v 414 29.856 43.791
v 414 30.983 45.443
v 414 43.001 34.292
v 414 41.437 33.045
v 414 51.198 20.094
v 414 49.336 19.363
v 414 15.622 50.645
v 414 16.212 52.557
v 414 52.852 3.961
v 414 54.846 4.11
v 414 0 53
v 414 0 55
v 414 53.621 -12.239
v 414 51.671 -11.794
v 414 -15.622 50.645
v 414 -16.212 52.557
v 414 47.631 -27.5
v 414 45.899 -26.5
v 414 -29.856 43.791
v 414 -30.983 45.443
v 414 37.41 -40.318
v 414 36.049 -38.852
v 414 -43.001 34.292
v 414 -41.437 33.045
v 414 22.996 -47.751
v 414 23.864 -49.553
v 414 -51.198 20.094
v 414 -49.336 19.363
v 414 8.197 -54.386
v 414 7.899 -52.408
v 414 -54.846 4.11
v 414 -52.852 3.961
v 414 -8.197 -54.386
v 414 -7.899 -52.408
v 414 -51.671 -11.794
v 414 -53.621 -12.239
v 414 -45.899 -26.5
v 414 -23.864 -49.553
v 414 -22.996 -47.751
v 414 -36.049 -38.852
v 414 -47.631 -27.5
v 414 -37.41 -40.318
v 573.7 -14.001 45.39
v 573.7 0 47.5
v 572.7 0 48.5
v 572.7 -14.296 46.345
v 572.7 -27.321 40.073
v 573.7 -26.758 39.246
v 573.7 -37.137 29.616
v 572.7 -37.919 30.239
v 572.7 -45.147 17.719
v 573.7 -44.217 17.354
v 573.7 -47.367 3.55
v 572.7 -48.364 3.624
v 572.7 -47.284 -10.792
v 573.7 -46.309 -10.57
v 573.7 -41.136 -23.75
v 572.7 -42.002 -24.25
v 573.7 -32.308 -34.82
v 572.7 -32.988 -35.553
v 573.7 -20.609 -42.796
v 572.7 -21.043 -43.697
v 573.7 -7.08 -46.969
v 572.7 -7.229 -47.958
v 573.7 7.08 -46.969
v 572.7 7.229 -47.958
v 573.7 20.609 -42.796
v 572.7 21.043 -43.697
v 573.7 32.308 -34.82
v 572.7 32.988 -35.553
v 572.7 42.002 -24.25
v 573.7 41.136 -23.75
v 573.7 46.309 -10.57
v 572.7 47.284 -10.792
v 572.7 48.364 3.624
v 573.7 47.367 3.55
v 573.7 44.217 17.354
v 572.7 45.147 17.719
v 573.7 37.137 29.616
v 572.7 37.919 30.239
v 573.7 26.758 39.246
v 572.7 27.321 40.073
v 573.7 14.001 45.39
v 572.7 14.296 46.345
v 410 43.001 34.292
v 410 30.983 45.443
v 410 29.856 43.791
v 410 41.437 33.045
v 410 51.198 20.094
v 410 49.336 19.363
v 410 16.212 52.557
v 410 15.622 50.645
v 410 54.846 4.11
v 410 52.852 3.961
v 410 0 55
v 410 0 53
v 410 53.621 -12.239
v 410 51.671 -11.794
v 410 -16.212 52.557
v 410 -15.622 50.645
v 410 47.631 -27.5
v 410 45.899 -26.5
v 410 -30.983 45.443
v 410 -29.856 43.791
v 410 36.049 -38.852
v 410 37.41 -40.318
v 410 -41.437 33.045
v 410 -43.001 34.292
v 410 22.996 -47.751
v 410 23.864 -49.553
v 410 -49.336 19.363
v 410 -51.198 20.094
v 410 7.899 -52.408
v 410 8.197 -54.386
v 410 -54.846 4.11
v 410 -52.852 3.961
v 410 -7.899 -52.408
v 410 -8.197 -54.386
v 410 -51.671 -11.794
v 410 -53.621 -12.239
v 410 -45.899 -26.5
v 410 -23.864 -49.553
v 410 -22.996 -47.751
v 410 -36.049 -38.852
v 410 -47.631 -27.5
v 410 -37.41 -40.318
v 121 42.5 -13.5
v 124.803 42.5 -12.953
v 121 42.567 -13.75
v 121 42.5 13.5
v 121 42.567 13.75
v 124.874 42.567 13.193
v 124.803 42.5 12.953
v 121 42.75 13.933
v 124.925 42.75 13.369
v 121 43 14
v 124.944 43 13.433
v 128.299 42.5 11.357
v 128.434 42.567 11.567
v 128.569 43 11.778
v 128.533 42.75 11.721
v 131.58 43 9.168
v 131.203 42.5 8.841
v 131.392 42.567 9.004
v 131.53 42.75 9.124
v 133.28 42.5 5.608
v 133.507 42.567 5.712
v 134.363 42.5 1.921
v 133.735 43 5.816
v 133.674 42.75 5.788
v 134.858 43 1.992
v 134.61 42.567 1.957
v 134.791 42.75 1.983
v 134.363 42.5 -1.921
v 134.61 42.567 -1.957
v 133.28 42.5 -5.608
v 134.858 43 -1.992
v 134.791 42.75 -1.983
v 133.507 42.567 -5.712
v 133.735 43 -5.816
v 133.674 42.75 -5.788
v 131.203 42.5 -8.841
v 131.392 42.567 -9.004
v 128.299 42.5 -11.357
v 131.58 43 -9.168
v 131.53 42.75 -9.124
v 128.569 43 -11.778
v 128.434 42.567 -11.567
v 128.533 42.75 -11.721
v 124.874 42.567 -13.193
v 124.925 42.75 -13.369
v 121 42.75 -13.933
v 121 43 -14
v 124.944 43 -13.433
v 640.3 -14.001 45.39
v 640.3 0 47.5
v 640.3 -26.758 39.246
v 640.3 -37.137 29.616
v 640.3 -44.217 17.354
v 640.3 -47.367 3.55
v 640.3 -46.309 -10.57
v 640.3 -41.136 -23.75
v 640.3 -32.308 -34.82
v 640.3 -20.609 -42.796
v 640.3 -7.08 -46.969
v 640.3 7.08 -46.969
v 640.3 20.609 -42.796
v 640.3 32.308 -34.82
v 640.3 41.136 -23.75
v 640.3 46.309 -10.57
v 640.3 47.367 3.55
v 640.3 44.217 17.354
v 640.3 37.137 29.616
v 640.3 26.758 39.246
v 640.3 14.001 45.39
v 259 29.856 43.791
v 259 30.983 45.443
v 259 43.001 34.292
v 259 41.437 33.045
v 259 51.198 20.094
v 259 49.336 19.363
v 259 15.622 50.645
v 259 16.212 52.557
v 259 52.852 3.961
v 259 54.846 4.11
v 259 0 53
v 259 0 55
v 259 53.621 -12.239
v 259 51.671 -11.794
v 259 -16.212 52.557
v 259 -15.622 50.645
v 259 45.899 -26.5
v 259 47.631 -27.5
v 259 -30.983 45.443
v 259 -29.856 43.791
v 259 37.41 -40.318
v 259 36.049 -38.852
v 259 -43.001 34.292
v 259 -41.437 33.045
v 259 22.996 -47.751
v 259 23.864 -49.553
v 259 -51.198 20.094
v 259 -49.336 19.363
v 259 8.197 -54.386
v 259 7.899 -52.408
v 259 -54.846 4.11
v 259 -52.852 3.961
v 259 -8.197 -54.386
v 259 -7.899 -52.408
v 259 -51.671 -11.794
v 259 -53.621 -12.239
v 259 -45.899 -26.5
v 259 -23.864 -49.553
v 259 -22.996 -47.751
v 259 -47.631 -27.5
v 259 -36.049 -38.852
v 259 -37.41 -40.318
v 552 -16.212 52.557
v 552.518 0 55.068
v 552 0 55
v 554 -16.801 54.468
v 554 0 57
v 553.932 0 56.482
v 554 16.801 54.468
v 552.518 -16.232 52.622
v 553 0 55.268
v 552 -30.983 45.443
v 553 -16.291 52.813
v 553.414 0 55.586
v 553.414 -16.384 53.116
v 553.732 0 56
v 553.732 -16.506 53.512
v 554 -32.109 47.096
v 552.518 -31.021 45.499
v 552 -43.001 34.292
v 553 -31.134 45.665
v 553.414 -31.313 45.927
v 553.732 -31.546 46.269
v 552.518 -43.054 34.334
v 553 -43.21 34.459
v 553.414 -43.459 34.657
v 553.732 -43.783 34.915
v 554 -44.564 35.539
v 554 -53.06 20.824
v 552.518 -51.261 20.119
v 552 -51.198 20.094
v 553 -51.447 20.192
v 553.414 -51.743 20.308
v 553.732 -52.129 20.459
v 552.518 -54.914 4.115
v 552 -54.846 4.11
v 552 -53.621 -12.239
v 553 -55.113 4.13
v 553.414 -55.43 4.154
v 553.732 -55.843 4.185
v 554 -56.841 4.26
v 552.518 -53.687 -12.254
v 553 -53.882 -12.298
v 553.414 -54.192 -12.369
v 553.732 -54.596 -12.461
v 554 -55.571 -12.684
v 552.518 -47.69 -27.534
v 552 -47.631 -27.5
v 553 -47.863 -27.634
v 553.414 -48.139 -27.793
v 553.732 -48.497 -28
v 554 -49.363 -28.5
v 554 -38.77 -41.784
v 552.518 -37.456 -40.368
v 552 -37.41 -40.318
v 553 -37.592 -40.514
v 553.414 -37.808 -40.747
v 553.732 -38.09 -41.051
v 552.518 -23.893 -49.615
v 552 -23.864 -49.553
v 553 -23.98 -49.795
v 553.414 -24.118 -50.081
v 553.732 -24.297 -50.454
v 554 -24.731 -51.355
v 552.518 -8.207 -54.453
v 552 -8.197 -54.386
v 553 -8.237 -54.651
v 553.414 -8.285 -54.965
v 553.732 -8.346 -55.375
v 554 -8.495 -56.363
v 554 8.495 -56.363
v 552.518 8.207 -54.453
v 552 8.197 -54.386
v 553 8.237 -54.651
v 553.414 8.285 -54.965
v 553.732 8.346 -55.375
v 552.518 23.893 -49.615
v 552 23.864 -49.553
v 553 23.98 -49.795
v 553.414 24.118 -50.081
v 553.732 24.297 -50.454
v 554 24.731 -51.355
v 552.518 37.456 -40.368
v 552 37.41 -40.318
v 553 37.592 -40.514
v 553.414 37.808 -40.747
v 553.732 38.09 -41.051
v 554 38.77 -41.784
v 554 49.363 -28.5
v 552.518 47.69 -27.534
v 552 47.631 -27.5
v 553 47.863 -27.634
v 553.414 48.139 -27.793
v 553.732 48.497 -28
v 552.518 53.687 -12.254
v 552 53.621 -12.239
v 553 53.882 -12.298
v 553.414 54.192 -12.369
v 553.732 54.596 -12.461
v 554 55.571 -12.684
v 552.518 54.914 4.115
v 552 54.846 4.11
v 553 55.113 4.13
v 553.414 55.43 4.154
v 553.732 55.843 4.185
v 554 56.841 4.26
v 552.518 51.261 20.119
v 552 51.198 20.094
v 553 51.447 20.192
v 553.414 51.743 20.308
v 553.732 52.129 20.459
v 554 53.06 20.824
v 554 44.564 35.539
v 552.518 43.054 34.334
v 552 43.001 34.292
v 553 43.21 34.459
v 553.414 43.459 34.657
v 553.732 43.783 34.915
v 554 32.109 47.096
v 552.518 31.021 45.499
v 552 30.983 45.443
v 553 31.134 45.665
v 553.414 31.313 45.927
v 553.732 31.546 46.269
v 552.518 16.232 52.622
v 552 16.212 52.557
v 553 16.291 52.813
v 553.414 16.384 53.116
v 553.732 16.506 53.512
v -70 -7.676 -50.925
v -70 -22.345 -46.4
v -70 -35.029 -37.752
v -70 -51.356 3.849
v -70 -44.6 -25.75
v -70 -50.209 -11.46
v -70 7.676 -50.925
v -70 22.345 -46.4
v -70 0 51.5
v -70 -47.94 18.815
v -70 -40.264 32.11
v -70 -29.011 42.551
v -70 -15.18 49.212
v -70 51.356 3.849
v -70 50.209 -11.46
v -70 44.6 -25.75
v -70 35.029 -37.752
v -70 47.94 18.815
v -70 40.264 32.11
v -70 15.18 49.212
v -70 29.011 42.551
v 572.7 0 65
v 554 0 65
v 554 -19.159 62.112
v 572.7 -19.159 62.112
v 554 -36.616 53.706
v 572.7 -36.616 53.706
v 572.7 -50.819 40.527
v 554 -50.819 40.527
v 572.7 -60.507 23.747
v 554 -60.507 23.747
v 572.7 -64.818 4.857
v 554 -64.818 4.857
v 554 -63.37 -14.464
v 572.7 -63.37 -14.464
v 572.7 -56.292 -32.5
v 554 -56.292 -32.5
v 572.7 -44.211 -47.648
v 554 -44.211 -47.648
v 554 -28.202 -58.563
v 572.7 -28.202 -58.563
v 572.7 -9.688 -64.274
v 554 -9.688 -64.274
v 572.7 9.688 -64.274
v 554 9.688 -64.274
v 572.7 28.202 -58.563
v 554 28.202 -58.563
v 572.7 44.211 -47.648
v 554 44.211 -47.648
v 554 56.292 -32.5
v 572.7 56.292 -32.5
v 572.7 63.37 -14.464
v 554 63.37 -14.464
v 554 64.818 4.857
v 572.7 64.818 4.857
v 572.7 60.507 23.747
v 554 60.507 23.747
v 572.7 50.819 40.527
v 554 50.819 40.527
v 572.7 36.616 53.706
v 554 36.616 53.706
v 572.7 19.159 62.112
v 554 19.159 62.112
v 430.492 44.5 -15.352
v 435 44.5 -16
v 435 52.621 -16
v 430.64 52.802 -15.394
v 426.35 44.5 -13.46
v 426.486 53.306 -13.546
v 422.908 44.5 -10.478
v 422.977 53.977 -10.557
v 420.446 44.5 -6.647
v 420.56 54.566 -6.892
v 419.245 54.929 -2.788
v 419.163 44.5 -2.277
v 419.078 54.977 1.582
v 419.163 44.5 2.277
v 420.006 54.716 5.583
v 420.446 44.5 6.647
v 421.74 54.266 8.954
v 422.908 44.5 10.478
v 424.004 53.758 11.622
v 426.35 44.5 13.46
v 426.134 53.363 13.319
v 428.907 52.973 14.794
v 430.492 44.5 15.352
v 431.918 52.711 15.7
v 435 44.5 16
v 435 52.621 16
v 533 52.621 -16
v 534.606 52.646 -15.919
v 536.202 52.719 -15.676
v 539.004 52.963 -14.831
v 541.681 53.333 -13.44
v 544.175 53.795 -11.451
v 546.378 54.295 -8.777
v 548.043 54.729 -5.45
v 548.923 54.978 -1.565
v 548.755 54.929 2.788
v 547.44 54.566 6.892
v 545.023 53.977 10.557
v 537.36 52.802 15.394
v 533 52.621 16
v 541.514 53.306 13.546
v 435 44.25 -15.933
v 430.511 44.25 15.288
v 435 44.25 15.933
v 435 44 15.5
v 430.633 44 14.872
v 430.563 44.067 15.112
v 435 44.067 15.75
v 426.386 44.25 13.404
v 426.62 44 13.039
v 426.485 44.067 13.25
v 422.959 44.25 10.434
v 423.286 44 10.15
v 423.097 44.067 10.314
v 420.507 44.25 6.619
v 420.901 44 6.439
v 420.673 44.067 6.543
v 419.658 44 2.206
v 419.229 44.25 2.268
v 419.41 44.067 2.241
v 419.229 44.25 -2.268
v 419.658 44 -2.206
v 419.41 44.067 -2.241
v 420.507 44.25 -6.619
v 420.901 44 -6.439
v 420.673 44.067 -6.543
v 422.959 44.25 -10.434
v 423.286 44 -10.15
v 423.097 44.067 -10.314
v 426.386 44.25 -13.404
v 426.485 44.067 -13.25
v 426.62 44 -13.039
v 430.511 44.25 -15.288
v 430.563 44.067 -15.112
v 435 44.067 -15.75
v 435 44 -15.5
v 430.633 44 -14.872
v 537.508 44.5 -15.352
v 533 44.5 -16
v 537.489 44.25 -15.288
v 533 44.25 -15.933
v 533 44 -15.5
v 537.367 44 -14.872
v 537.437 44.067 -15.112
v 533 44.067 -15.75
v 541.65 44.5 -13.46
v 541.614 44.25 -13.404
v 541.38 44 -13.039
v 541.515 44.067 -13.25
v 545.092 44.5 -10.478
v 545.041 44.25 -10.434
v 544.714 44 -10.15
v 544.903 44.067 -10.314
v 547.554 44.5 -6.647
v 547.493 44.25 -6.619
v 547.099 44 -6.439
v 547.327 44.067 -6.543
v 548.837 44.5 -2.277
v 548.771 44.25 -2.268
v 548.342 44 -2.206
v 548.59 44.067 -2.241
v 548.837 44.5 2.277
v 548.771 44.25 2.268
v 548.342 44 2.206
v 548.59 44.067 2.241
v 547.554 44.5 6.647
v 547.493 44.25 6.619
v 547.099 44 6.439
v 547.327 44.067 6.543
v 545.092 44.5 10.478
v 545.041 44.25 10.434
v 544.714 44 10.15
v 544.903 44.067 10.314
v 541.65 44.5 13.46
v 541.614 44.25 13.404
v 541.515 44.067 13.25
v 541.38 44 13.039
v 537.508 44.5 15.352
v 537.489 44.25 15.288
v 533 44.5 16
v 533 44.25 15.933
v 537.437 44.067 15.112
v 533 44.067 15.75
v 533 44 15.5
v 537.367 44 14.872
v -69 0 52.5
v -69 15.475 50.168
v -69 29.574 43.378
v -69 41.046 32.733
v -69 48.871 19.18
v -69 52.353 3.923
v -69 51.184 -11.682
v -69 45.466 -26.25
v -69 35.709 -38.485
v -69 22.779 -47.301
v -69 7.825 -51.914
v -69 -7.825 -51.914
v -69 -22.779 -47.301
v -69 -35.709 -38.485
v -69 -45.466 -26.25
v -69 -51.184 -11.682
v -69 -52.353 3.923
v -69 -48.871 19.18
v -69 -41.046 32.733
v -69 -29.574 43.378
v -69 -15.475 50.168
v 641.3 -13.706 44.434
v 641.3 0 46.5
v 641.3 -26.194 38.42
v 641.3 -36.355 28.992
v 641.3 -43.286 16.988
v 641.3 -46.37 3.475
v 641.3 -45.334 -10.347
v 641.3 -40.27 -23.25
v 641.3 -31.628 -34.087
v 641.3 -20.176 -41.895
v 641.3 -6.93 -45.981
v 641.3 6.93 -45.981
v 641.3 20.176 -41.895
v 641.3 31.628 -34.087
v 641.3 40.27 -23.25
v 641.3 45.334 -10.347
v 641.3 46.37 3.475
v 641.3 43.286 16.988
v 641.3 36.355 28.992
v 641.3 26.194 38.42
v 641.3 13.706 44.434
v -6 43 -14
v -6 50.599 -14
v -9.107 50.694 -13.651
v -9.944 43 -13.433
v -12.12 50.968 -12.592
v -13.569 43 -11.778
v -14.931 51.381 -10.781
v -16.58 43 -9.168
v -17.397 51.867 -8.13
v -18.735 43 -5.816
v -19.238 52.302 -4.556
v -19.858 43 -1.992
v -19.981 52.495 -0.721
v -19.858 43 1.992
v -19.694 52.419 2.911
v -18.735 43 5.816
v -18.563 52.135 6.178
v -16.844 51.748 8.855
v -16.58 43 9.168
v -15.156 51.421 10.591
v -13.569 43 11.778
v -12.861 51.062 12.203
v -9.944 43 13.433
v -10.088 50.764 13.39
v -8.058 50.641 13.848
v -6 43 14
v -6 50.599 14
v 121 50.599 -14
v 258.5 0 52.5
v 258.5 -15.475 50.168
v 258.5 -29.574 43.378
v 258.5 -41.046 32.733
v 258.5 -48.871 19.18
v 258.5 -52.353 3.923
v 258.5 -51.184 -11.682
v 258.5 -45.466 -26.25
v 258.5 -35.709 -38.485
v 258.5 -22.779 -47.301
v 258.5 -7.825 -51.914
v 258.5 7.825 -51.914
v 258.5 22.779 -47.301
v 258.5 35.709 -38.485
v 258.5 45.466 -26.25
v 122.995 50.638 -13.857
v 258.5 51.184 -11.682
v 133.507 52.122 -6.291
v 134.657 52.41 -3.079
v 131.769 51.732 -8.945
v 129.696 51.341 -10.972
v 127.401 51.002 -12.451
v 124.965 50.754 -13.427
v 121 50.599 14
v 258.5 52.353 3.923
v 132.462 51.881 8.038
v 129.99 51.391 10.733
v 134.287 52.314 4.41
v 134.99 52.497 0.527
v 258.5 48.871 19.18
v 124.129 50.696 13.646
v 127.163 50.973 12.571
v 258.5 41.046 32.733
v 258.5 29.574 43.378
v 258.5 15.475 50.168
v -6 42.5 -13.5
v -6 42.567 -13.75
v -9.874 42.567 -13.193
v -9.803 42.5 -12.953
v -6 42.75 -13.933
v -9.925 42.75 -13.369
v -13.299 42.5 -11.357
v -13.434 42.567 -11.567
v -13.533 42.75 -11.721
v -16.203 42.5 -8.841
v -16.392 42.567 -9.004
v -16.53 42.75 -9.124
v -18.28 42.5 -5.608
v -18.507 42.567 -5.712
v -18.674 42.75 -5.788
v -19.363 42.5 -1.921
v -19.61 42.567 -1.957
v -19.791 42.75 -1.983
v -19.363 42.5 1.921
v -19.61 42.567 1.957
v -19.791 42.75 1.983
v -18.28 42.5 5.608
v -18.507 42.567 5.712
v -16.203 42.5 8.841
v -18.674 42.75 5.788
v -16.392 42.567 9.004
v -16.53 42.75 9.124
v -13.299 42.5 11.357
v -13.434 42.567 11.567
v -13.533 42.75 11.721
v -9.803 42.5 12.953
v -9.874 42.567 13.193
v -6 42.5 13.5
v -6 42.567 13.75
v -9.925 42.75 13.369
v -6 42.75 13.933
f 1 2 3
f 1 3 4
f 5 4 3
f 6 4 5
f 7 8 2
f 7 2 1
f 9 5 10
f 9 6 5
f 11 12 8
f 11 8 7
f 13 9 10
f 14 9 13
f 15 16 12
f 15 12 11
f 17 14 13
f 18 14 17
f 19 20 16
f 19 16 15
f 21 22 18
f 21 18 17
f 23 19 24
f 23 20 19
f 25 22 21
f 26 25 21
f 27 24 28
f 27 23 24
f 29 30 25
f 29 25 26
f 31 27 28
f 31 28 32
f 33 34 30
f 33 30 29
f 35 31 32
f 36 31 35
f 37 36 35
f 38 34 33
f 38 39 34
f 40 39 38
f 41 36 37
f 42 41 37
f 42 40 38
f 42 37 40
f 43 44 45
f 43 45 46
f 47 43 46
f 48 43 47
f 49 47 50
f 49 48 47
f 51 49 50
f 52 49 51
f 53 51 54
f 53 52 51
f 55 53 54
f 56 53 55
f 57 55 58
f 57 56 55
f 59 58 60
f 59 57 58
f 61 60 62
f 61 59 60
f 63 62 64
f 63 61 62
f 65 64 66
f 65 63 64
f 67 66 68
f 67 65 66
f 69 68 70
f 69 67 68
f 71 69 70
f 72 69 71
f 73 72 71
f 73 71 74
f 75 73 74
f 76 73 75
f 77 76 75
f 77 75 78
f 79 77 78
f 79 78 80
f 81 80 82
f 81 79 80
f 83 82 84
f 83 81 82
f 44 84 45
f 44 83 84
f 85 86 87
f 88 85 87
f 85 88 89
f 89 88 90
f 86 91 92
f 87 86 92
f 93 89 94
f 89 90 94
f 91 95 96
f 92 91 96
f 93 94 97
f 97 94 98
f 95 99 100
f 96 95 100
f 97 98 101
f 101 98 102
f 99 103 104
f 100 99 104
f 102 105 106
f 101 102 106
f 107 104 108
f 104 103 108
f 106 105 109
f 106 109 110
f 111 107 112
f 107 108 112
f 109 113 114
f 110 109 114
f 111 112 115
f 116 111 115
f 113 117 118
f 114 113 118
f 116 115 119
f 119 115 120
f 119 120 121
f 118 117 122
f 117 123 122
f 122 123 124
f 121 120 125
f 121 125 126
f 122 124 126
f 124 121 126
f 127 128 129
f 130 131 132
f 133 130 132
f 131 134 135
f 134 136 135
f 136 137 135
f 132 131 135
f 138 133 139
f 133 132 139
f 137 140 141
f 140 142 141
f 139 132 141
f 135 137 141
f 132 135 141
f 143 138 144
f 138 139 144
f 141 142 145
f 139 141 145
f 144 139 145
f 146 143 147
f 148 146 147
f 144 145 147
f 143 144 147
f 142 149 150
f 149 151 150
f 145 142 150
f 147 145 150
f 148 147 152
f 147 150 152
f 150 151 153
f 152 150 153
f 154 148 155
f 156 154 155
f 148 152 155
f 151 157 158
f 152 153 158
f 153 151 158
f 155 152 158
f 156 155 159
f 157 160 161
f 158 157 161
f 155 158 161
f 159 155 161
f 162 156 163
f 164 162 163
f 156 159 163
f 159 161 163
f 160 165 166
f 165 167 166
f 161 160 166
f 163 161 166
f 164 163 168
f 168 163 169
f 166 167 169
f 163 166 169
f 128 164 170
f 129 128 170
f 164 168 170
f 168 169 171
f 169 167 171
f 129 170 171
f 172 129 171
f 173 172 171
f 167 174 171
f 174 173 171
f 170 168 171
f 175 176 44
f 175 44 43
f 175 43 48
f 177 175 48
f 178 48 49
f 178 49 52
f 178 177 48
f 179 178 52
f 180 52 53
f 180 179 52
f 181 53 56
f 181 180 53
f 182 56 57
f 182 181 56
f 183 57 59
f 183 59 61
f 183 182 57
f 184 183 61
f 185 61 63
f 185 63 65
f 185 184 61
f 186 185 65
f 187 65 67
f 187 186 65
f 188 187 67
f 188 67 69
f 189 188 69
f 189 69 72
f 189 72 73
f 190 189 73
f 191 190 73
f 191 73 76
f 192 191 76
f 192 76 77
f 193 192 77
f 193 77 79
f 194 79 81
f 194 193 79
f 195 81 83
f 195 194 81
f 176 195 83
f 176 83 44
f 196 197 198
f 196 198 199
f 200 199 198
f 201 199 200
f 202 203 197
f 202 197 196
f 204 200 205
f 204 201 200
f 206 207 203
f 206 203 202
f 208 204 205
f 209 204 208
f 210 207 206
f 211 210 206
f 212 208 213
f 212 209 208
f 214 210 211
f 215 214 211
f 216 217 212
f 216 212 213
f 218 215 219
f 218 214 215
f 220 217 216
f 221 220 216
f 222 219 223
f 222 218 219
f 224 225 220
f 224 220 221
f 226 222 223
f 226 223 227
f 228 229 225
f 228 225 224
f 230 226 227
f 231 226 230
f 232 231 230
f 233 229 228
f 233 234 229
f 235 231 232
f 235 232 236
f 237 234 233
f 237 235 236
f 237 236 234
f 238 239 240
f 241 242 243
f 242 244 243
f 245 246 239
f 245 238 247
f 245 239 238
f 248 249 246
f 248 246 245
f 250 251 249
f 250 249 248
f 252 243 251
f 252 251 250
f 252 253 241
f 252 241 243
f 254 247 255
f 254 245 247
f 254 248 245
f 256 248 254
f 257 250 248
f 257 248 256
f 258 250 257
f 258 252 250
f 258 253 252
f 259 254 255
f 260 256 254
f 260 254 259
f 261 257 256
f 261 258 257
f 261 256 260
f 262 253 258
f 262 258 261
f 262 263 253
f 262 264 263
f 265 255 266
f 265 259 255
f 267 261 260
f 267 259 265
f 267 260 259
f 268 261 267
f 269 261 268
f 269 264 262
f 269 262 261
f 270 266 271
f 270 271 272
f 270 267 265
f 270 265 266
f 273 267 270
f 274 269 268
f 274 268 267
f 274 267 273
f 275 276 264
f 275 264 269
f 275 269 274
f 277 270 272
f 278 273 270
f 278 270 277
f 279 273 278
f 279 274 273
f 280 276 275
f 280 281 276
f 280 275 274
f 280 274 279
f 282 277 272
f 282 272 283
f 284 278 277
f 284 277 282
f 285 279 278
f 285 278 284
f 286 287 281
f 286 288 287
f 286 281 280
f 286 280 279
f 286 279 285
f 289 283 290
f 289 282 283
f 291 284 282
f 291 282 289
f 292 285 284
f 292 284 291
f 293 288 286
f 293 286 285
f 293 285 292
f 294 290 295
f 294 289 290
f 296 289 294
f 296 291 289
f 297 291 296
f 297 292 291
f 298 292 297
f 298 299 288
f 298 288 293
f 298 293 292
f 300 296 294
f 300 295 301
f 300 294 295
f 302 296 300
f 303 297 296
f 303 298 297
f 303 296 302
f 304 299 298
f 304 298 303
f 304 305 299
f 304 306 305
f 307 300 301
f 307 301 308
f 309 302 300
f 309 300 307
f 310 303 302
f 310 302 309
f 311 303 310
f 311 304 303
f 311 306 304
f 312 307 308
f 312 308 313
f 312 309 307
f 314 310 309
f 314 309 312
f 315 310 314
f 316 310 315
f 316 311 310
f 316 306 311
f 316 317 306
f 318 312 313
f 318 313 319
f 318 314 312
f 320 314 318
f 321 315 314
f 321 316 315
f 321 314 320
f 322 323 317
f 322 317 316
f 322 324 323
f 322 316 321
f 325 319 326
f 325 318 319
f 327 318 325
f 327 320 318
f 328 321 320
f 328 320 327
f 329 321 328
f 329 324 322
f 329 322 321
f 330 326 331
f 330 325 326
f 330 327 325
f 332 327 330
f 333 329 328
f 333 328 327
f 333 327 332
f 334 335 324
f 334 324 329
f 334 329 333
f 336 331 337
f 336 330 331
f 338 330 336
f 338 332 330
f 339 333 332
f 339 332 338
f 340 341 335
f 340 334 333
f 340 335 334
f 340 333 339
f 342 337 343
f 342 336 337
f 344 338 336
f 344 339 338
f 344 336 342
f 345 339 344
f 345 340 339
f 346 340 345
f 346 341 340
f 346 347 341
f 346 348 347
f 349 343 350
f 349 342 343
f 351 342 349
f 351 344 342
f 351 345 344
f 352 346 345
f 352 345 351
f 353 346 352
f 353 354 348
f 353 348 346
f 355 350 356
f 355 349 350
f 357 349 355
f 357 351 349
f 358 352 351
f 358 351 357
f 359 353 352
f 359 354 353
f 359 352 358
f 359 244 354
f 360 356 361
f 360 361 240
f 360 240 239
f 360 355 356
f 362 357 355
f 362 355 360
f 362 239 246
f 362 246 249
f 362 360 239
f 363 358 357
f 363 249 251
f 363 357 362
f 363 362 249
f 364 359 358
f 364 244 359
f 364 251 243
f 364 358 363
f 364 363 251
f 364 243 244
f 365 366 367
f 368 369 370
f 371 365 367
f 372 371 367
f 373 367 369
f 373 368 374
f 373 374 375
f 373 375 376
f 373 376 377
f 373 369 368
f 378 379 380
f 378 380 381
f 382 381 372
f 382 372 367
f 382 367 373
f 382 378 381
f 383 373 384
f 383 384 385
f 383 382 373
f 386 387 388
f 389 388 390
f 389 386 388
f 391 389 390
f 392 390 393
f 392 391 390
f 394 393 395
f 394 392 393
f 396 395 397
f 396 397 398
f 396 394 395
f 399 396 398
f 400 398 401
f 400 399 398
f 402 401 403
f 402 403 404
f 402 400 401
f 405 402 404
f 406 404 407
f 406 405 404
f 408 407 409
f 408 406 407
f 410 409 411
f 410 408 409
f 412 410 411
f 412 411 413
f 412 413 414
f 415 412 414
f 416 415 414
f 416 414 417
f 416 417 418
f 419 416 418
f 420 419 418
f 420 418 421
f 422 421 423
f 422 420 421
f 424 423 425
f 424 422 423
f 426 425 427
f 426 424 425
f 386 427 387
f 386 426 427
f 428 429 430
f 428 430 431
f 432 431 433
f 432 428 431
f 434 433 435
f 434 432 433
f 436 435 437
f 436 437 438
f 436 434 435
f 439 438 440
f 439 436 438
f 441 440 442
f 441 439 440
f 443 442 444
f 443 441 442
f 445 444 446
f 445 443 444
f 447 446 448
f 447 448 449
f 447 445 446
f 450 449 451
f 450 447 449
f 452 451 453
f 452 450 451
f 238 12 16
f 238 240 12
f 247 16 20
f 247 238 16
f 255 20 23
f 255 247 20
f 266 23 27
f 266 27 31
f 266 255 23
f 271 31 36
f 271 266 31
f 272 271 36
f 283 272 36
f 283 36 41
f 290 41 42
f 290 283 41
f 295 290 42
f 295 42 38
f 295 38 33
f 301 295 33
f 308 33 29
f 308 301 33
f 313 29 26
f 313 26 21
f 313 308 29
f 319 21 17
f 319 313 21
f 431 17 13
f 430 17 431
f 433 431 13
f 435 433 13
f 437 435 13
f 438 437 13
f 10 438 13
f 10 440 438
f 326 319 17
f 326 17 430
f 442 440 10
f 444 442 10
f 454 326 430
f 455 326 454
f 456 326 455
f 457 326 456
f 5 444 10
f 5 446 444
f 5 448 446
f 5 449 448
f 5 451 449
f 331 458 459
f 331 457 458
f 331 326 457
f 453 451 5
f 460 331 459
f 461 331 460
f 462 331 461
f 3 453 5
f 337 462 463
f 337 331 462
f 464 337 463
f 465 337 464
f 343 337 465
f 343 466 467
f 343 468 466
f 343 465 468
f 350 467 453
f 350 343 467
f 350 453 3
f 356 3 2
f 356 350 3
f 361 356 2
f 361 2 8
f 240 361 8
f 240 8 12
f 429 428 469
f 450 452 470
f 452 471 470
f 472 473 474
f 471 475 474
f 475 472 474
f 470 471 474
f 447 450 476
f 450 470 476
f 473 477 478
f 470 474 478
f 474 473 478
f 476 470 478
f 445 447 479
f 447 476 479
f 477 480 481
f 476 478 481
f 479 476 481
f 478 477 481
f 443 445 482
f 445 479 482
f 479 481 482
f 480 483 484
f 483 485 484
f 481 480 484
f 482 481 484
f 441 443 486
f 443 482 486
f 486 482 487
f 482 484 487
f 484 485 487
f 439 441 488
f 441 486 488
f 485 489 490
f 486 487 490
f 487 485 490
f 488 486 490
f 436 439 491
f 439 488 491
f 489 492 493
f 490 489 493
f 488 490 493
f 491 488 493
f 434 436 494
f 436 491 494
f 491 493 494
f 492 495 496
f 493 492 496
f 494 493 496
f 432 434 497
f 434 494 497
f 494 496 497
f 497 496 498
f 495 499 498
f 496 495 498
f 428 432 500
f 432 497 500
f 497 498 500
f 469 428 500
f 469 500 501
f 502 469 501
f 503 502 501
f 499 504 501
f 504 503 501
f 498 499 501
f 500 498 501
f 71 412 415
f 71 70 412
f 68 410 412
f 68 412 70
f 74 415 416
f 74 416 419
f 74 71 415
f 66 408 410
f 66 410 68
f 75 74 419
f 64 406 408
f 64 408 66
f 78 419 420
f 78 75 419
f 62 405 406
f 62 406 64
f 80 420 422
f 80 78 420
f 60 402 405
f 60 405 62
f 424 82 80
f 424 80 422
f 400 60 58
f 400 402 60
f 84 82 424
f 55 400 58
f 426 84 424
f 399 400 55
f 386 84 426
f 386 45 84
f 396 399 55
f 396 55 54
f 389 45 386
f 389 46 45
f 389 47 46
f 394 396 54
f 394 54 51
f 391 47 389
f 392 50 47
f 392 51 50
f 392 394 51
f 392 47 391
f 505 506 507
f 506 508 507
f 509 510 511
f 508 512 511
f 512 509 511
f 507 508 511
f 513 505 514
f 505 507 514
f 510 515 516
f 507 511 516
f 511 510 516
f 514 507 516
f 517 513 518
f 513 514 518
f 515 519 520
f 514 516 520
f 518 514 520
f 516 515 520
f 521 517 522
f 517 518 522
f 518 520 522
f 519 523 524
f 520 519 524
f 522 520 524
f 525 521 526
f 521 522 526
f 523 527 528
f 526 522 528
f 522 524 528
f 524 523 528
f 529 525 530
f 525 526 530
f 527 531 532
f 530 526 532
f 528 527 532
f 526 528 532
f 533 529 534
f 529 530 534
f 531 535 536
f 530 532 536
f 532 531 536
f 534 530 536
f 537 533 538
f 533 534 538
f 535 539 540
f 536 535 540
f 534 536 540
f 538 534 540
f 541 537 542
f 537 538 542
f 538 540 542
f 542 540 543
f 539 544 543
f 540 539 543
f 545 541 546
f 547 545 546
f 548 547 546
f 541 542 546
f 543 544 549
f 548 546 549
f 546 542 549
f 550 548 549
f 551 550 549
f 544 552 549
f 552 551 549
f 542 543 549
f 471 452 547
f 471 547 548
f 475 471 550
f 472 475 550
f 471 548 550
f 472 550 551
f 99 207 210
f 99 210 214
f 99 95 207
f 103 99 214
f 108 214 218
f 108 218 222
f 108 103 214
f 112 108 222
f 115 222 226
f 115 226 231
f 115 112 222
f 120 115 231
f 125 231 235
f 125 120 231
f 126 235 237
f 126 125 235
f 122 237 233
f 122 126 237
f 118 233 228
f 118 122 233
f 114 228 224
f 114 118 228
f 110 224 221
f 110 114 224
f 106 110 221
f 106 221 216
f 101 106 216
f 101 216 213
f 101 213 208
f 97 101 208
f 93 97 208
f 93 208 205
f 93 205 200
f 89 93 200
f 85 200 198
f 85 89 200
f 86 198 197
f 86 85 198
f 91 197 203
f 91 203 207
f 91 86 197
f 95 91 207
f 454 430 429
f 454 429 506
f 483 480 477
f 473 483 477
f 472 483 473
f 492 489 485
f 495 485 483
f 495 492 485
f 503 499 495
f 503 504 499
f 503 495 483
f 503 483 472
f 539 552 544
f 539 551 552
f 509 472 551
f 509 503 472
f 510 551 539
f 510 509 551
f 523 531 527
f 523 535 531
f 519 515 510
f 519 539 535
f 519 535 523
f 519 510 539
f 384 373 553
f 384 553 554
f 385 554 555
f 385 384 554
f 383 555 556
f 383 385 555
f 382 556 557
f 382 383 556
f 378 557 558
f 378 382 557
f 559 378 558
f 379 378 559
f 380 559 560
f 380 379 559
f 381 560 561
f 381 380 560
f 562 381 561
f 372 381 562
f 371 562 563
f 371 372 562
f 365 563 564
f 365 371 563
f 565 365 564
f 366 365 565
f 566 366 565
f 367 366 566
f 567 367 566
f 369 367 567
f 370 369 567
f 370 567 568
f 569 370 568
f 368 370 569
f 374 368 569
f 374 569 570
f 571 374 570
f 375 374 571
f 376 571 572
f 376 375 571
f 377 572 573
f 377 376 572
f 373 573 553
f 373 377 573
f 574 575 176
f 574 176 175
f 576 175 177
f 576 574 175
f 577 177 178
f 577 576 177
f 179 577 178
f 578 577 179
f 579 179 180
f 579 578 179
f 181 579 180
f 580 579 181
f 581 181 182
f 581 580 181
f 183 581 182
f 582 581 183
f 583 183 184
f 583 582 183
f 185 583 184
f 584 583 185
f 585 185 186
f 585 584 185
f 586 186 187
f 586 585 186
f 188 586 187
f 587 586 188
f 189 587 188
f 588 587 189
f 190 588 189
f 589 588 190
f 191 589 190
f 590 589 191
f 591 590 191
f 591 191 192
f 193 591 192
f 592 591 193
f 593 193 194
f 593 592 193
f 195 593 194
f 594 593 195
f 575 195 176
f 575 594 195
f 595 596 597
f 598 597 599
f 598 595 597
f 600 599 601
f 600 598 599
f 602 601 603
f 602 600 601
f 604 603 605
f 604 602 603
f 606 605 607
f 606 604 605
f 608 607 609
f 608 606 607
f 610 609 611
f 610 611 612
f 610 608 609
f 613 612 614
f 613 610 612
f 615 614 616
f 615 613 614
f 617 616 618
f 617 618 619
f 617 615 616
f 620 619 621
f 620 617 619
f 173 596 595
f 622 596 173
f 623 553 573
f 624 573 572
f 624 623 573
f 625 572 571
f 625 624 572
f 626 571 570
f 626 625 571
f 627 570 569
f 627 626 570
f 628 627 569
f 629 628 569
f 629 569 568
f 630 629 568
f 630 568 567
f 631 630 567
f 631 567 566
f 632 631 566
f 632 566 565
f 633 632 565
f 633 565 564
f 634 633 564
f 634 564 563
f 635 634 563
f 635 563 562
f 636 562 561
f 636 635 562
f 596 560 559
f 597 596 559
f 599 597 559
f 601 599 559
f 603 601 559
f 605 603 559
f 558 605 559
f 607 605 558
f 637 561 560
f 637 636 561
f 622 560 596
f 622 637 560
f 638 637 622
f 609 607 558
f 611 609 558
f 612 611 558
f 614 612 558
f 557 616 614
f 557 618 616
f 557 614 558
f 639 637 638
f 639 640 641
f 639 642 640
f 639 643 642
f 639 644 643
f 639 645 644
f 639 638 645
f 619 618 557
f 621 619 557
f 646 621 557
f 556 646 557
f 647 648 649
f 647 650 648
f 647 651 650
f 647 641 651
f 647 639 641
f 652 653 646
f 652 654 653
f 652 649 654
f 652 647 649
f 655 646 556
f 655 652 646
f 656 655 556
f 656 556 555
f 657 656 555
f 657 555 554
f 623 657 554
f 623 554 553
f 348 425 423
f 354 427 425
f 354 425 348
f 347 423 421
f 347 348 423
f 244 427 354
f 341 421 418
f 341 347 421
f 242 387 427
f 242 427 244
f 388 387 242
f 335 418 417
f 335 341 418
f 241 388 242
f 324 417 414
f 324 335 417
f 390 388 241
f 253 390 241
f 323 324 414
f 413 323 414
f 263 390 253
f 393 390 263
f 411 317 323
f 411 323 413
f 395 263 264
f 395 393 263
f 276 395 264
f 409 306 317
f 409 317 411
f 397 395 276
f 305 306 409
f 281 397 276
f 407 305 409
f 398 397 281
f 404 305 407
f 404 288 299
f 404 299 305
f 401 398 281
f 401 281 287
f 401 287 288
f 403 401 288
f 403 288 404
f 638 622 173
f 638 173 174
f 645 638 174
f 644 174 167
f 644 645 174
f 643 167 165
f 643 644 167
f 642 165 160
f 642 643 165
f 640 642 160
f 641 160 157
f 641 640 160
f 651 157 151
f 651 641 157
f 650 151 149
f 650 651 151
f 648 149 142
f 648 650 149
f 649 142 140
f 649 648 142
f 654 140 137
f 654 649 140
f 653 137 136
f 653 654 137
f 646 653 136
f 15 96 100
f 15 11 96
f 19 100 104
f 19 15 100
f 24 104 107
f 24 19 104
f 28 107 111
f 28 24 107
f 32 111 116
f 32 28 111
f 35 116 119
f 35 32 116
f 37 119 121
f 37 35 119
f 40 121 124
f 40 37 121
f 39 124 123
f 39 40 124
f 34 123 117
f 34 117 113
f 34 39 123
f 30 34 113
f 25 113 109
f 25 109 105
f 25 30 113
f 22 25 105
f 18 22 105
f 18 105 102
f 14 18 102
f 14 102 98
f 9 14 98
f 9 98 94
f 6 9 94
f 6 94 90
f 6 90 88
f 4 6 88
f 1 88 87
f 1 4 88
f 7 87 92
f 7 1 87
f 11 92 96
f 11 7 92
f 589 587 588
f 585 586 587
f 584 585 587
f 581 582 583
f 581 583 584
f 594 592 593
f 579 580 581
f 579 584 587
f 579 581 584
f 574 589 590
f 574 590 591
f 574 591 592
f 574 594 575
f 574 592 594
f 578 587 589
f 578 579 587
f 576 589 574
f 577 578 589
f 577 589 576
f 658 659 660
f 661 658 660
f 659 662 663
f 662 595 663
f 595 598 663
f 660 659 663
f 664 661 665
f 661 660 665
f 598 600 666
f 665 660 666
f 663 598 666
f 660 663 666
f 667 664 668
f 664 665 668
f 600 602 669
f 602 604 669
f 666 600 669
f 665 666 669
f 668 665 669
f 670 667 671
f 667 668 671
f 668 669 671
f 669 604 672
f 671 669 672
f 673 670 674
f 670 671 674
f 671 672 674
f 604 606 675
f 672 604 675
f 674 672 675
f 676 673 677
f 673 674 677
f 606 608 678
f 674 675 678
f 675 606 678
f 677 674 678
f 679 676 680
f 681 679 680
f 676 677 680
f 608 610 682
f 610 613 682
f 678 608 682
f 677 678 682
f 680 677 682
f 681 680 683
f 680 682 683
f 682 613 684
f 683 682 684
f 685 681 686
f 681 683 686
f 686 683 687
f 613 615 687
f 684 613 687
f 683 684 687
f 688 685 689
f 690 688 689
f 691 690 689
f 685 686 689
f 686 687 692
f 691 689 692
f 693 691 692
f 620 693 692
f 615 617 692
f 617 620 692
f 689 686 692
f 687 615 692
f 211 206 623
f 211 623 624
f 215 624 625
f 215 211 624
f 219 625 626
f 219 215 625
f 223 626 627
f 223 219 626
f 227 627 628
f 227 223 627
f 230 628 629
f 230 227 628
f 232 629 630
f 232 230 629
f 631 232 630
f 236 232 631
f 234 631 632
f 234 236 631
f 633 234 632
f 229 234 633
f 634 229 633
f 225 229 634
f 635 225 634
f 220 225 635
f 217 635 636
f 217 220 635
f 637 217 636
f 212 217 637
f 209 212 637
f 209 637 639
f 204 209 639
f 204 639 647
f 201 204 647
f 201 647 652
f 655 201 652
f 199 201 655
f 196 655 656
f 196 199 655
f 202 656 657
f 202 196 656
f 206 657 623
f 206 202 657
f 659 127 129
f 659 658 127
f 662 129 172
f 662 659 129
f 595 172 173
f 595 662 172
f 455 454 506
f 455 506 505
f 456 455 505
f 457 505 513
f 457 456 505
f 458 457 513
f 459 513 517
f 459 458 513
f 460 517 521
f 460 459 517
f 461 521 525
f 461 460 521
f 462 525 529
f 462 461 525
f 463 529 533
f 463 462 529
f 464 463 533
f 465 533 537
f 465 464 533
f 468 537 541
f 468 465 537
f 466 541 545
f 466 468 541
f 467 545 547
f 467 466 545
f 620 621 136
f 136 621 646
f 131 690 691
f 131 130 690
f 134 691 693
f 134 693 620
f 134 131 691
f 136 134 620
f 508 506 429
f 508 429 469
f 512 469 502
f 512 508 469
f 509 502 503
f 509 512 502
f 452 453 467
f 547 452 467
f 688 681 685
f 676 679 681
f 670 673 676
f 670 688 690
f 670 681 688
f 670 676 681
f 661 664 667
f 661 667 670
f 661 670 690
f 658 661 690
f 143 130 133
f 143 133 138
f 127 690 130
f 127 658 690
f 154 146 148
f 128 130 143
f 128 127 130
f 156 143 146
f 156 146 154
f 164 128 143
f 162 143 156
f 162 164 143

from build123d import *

# Parameters (mm, degrees)
SMUSSO1_SIZE                  = 0.5
SMUSSO2_SIZE                  = 1
TAGLIO_ESTRUSIONE1_DEPTH      = 16
TAGLIO_ESTRUSIONE1_DEPTH_BACK = 16
SCHIZZO2_W                    = 130
SCHIZZO2_H                    = 18
RACCORDO1_R                   = 0.5
RACCORDO2_R                   = 16
RACCORDO3_R                   = 2
SCHIZZO3_W                    = 4
SCHIZZO3_H                    = 18.361474643
SCHIZZO6_R                    = 52.5
ESTRUSIONE_ESTRUSIONE1_DEPTH  = 70
TAGLIO_ESTRUSIONE2_DEPTH      = 14
TAGLIO_ESTRUSIONE2_DEPTH_BACK = 14
SCHIZZO4_W                    = 155
SCHIZZO4_H                    = 16
RACCORDO4_R                   = 14
RACCORDO5_R                   = 0.5
ESTRUSIONE_ESTRUSIONE2_START  = 13
SCHIZZO7_R                    = 47.5
ESTRUSIONE_ESTRUSIONE2_DEPTH  = 13
SMUSSO3_SIZE                  = 1


with BuildPart() as part:
    # Schizzo1 → Rivoluzione1 (revolve)
    with BuildSketch(Plane.XY, mode=Mode.PRIVATE) as rivoluzione1_sk:
        Polygon((0, 0), (0, 52.5), (259, 52.5), (259, 55), (554, 55), (554, 65), (572.7, 65), (572.7, 47.5), (628.3, 47.5), (628.3, 0), align=None)
    revolve(rivoluzione1_sk.sketch.rotate(Axis((-197.2323049, 0, 0), (1, 0, 0)), 90), axis=Axis((-197.2323049, 0, 0), (1, 0, 0)))

    # Smusso1
    smusso1_edges = [part.edges().sort_by_distance(p)[0] for p in [
        (259, 0, -52.5),
    ]]
    chamfer(smusso1_edges, length=SMUSSO1_SIZE)

    # Smusso2
    smusso2_edges = [part.edges().sort_by_distance(p)[0] for p in [
        (572.7, 0, -47.5),
    ]]
    chamfer(smusso2_edges, length=SMUSSO2_SIZE)

    # Schizzo2 → Taglio-Estrusione1 (cut, two sides: drawn at the far end of the back side and taken through both)
    with BuildSketch(Plane.XY.offset(-TAGLIO_ESTRUSIONE1_DEPTH_BACK)):
        with Locations((484, 53)):
            Rectangle(SCHIZZO2_W, SCHIZZO2_H)
    extrude(amount=TAGLIO_ESTRUSIONE1_DEPTH + TAGLIO_ESTRUSIONE1_DEPTH_BACK, mode=Mode.SUBTRACT)

    # Raccordo1
    raccordo1_edges = [part.edges().sort_by_distance(p)[0] for p in [
        (549, 44, 0),
        (484, 44, 16),
        (419, 44, 0),
        (484, 44, -16),
    ]]
    fillet(raccordo1_edges, radius=RACCORDO1_R)

    # Raccordo2
    # the kernel refuses this fillet: 16 mm, written as the material it adds along each edge
    with BuildSketch(Plane(origin=(533, 44, 0), x_dir=(1, 0, 0), z_dir=(0, 0, -1))) as raccordo2_piece_1:
        with BuildLine():
            CenterArc((15.5, -0.5), 0.5, 0, 90)
            Line((16, -0.5), (16, 0))
            Line((16, 0), (15.5, 0))
        make_face()
    revolve(axis=Axis((533, 44, 0), (0, -1, 0)), revolution_arc=90)
    with BuildSketch(Plane(origin=(435, 44, 0), x_dir=(-1, 0, 0), z_dir=(0, 0, 1))) as raccordo2_piece_2:
        with BuildLine():
            CenterArc((15.5, -0.5), 0.5, 0, 90)
            Line((16, -0.5), (16, 0))
            Line((16, 0), (15.5, 0))
        make_face()
    revolve(axis=Axis((435, 44, 0), (0, -1, 0)), revolution_arc=90)
    with BuildSketch(Plane(origin=(435, 44, 0), x_dir=(0, 0, 1), z_dir=(1, 0, 0))) as raccordo2_piece_3:
        with BuildLine():
            CenterArc((15.5, -0.5), 0.5, 0, 90)
            Line((16, -0.5), (16, 0))
            Line((16, 0), (15.5, 0))
        make_face()
    revolve(axis=Axis((435, 44, 0), (0, -1, 0)), revolution_arc=90)
    with BuildSketch(Plane(origin=(533, 44, 0), x_dir=(0, 0, -1), z_dir=(-1, 0, 0))) as raccordo2_piece_4:
        with BuildLine():
            CenterArc((15.5, -0.5), 0.5, 0, 90)
            Line((16, -0.5), (16, 0))
            Line((16, 0), (15.5, 0))
        make_face()
    revolve(axis=Axis((533, 44, 0), (0, -1, 0)), revolution_arc=90)
    with BuildSketch(Plane(origin=(549, 92.621288468, -16), x_dir=(-1, 0, 0), z_dir=(0, -1, 0))) as raccordo2_piece_5_section:
        with BuildLine():
            CenterArc((RACCORDO2_R, -RACCORDO2_R), RACCORDO2_R, 90, 90)
            Line((0, -RACCORDO2_R), (0, 0))
            Line((0, 0), (RACCORDO2_R, 0))
        make_face()
    raccordo2_piece_5 = extrude(amount=48.621288468, mode=Mode.PRIVATE)
    raccordo2_piece_5 = raccordo2_piece_5 & Plane(origin=(545.534076623, 0, 0), x_dir=(0, 0, 1), z_dir=(1, 0, 0)) * Cylinder(55, 162, mode=Mode.PRIVATE)
    add(raccordo2_piece_5)
    with BuildSketch(Plane(origin=(419, 44, 16), x_dir=(0, 0, -1), z_dir=(0, 1, 0))) as raccordo2_piece_6_section:
        with BuildLine():
            CenterArc((RACCORDO2_R, -RACCORDO2_R), RACCORDO2_R, 90, 90)
            Line((0, -RACCORDO2_R), (0, 0))
            Line((0, 0), (RACCORDO2_R, 0))
        make_face()
    raccordo2_piece_6 = extrude(amount=48.621288468, mode=Mode.PRIVATE)
    raccordo2_piece_6 = raccordo2_piece_6 & Plane(origin=(422.465920441, 0, 0), x_dir=(0, 0, 1), z_dir=(1, 0, 0)) * Cylinder(55, 162, mode=Mode.PRIVATE)
    add(raccordo2_piece_6)
    with BuildSketch(Plane(origin=(419, 44, -16), x_dir=(0, 0, 1), z_dir=(0, 1, 0))) as raccordo2_piece_7_section:
        with BuildLine():
            CenterArc((RACCORDO2_R, RACCORDO2_R), RACCORDO2_R, 180, 90)
            Line((0, RACCORDO2_R), (0, 0))
            Line((0, 0), (RACCORDO2_R, 0))
        make_face()
    raccordo2_piece_7 = extrude(amount=48.621288468, mode=Mode.PRIVATE)
    raccordo2_piece_7 = raccordo2_piece_7 & Plane(origin=(422.465924893, 0, 0), x_dir=(0, 0, 1), z_dir=(1, 0, 0)) * Cylinder(55, 162, mode=Mode.PRIVATE)
    add(raccordo2_piece_7)
    with BuildSketch(Plane(origin=(549, 92.621288468, 16), x_dir=(-1, 0, 0), z_dir=(0, -1, 0))) as raccordo2_piece_8_section:
        with BuildLine():
            CenterArc((RACCORDO2_R, RACCORDO2_R), RACCORDO2_R, 180, 90)
            Line((0, RACCORDO2_R), (0, 0))
            Line((0, 0), (RACCORDO2_R, 0))
        make_face()
    raccordo2_piece_8 = extrude(amount=48.621288468, mode=Mode.PRIVATE)
    raccordo2_piece_8 = raccordo2_piece_8 & Plane(origin=(545.534073929, 0, 0), x_dir=(0, 0, 1), z_dir=(1, 0, 0)) * Cylinder(55, 162, mode=Mode.PRIVATE)
    add(raccordo2_piece_8)

    # Raccordo3
    raccordo3_edges = [part.edges().sort_by_distance(p)[0] for p in [
        (554, 0, -55),
    ]]
    fillet(raccordo3_edges, radius=RACCORDO3_R)

    # Schizzo3 → Taglia-Rivoluzione1 (revolve, cut)
    with BuildSketch(Plane.XY, mode=Mode.PRIVATE) as taglia_rivoluzione1_sk:
        with Locations((412, 62.180737322)):
            Rectangle(SCHIZZO3_W, SCHIZZO3_H)
    revolve(taglia_rivoluzione1_sk.sketch.rotate(Axis((-65.307499475, 0, 0), (1, 0, 0)), 90), axis=Axis((-65.307499475, 0, 0), (1, 0, 0)), mode=Mode.SUBTRACT)

    # Schizzo6 → Estrusione-Estrusione1 (add)
    with BuildSketch(Plane.ZY):
        Circle(SCHIZZO6_R)
    extrude(amount=ESTRUSIONE_ESTRUSIONE1_DEPTH)

    # Schizzo4 → Taglio-Estrusione2 (cut, two sides: drawn at the far end of the back side and taken through both)
    with BuildSketch(Plane.XY.offset(-TAGLIO_ESTRUSIONE2_DEPTH_BACK)):
        with Locations((57.5, 50.5)):
            Rectangle(SCHIZZO4_W, SCHIZZO4_H)
    extrude(amount=TAGLIO_ESTRUSIONE2_DEPTH + TAGLIO_ESTRUSIONE2_DEPTH_BACK, mode=Mode.SUBTRACT)

    # Raccordo4
    # the kernel refuses this fillet: 14 mm, written as the material it adds along each edge
    with BuildSketch(Plane(origin=(135, 85.598913032, 14), x_dir=(-1, 0, 0), z_dir=(0, -1, 0))) as raccordo4_piece_1_section:
        with BuildLine():
            CenterArc((RACCORDO4_R, RACCORDO4_R), RACCORDO4_R, 180, 90)
            Line((0, RACCORDO4_R), (0, 0))
            Line((0, 0), (RACCORDO4_R, 0))
        make_face()
    raccordo4_piece_1 = extrude(amount=78.098913032, mode=Mode.PRIVATE)
    raccordo4_piece_1 = raccordo4_piece_1 & Plane(origin=(131.948408204, 0, 0), x_dir=(0, 0, 1), z_dir=(1, 0, 0)) * Cylinder(52.5, 213, mode=Mode.PRIVATE)
    add(raccordo4_piece_1)
    with BuildSketch(Plane(origin=(135, 85.598913032, -14), x_dir=(0, 0, 1), z_dir=(0, -1, 0))) as raccordo4_piece_2_section:
        with BuildLine():
            CenterArc((RACCORDO4_R, RACCORDO4_R), RACCORDO4_R, 180, 90)
            Line((0, RACCORDO4_R), (0, 0))
            Line((0, 0), (RACCORDO4_R, 0))
        make_face()
    raccordo4_piece_2 = extrude(amount=78.098913032, mode=Mode.PRIVATE)
    raccordo4_piece_2 = raccordo4_piece_2 & Plane(origin=(131.948403613, 0, 0), x_dir=(0, 0, 1), z_dir=(1, 0, 0)) * Cylinder(52.5, 213, mode=Mode.PRIVATE)
    add(raccordo4_piece_2)
    with BuildSketch(Plane(origin=(-20, 7.5, 14), x_dir=(0, 0, -1), z_dir=(0, 1, 0))) as raccordo4_piece_3_section:
        with BuildLine():
            CenterArc((RACCORDO4_R, -RACCORDO4_R), RACCORDO4_R, 90, 90)
            Line((0, -RACCORDO4_R), (0, 0))
            Line((0, 0), (RACCORDO4_R, 0))
        make_face()
    raccordo4_piece_3 = extrude(amount=78.098913032, mode=Mode.PRIVATE)
    raccordo4_piece_3 = raccordo4_piece_3 & Plane(origin=(-16.8304684, 0, 0), x_dir=(0, 0, 1), z_dir=(1, 0, 0)) * Cylinder(52.5, 213, mode=Mode.PRIVATE)
    add(raccordo4_piece_3)
    with BuildSketch(Plane(origin=(-20, 7.5, -14), x_dir=(0, 0, 1), z_dir=(0, 1, 0))) as raccordo4_piece_4_section:
        with BuildLine():
            CenterArc((RACCORDO4_R, RACCORDO4_R), RACCORDO4_R, 180, 90)
            Line((0, RACCORDO4_R), (0, 0))
            Line((0, 0), (RACCORDO4_R, 0))
        make_face()
    raccordo4_piece_4 = extrude(amount=78.098913032, mode=Mode.PRIVATE)
    raccordo4_piece_4 = raccordo4_piece_4 & Plane(origin=(-16.8304684, 0, 0), x_dir=(0, 0, 1), z_dir=(1, 0, 0)) * Cylinder(52.5, 213, mode=Mode.PRIVATE)
    add(raccordo4_piece_4)

    # Raccordo5
    raccordo5_edges = [part.edges().sort_by_distance(p)[0] for p in [
        (57.5, 42.5, 14),
        (57.5, 42.5, -14),
        (-20, 42.5, 0),
        (-20, 42.5, 0),
        (135, 42.5, 0),
        (135, 42.5, 0),
    ]]
    fillet(raccordo5_edges, radius=RACCORDO5_R)

    # Schizzo7 → Estrusione-Estrusione2 (add)
    with BuildSketch(Plane(origin=(628.3, 0, 0), x_dir=(0, 0, -1), z_dir=(1, 0, 0)).offset(ESTRUSIONE_ESTRUSIONE2_START)):
        with Locations(Location((0, 0, 0), (0, 0, 180))):
            Circle(SCHIZZO7_R)
    extrude(amount=-ESTRUSIONE_ESTRUSIONE2_DEPTH)

    # Smusso3
    smusso3_edges = [part.edges().sort_by_distance(p)[0] for p in [
        (-70, 0, -52.5),
        (641.3, 0, -47.5),
    ]]
    chamfer(smusso3_edges, length=SMUSSO3_SIZE)


solid = part.part
